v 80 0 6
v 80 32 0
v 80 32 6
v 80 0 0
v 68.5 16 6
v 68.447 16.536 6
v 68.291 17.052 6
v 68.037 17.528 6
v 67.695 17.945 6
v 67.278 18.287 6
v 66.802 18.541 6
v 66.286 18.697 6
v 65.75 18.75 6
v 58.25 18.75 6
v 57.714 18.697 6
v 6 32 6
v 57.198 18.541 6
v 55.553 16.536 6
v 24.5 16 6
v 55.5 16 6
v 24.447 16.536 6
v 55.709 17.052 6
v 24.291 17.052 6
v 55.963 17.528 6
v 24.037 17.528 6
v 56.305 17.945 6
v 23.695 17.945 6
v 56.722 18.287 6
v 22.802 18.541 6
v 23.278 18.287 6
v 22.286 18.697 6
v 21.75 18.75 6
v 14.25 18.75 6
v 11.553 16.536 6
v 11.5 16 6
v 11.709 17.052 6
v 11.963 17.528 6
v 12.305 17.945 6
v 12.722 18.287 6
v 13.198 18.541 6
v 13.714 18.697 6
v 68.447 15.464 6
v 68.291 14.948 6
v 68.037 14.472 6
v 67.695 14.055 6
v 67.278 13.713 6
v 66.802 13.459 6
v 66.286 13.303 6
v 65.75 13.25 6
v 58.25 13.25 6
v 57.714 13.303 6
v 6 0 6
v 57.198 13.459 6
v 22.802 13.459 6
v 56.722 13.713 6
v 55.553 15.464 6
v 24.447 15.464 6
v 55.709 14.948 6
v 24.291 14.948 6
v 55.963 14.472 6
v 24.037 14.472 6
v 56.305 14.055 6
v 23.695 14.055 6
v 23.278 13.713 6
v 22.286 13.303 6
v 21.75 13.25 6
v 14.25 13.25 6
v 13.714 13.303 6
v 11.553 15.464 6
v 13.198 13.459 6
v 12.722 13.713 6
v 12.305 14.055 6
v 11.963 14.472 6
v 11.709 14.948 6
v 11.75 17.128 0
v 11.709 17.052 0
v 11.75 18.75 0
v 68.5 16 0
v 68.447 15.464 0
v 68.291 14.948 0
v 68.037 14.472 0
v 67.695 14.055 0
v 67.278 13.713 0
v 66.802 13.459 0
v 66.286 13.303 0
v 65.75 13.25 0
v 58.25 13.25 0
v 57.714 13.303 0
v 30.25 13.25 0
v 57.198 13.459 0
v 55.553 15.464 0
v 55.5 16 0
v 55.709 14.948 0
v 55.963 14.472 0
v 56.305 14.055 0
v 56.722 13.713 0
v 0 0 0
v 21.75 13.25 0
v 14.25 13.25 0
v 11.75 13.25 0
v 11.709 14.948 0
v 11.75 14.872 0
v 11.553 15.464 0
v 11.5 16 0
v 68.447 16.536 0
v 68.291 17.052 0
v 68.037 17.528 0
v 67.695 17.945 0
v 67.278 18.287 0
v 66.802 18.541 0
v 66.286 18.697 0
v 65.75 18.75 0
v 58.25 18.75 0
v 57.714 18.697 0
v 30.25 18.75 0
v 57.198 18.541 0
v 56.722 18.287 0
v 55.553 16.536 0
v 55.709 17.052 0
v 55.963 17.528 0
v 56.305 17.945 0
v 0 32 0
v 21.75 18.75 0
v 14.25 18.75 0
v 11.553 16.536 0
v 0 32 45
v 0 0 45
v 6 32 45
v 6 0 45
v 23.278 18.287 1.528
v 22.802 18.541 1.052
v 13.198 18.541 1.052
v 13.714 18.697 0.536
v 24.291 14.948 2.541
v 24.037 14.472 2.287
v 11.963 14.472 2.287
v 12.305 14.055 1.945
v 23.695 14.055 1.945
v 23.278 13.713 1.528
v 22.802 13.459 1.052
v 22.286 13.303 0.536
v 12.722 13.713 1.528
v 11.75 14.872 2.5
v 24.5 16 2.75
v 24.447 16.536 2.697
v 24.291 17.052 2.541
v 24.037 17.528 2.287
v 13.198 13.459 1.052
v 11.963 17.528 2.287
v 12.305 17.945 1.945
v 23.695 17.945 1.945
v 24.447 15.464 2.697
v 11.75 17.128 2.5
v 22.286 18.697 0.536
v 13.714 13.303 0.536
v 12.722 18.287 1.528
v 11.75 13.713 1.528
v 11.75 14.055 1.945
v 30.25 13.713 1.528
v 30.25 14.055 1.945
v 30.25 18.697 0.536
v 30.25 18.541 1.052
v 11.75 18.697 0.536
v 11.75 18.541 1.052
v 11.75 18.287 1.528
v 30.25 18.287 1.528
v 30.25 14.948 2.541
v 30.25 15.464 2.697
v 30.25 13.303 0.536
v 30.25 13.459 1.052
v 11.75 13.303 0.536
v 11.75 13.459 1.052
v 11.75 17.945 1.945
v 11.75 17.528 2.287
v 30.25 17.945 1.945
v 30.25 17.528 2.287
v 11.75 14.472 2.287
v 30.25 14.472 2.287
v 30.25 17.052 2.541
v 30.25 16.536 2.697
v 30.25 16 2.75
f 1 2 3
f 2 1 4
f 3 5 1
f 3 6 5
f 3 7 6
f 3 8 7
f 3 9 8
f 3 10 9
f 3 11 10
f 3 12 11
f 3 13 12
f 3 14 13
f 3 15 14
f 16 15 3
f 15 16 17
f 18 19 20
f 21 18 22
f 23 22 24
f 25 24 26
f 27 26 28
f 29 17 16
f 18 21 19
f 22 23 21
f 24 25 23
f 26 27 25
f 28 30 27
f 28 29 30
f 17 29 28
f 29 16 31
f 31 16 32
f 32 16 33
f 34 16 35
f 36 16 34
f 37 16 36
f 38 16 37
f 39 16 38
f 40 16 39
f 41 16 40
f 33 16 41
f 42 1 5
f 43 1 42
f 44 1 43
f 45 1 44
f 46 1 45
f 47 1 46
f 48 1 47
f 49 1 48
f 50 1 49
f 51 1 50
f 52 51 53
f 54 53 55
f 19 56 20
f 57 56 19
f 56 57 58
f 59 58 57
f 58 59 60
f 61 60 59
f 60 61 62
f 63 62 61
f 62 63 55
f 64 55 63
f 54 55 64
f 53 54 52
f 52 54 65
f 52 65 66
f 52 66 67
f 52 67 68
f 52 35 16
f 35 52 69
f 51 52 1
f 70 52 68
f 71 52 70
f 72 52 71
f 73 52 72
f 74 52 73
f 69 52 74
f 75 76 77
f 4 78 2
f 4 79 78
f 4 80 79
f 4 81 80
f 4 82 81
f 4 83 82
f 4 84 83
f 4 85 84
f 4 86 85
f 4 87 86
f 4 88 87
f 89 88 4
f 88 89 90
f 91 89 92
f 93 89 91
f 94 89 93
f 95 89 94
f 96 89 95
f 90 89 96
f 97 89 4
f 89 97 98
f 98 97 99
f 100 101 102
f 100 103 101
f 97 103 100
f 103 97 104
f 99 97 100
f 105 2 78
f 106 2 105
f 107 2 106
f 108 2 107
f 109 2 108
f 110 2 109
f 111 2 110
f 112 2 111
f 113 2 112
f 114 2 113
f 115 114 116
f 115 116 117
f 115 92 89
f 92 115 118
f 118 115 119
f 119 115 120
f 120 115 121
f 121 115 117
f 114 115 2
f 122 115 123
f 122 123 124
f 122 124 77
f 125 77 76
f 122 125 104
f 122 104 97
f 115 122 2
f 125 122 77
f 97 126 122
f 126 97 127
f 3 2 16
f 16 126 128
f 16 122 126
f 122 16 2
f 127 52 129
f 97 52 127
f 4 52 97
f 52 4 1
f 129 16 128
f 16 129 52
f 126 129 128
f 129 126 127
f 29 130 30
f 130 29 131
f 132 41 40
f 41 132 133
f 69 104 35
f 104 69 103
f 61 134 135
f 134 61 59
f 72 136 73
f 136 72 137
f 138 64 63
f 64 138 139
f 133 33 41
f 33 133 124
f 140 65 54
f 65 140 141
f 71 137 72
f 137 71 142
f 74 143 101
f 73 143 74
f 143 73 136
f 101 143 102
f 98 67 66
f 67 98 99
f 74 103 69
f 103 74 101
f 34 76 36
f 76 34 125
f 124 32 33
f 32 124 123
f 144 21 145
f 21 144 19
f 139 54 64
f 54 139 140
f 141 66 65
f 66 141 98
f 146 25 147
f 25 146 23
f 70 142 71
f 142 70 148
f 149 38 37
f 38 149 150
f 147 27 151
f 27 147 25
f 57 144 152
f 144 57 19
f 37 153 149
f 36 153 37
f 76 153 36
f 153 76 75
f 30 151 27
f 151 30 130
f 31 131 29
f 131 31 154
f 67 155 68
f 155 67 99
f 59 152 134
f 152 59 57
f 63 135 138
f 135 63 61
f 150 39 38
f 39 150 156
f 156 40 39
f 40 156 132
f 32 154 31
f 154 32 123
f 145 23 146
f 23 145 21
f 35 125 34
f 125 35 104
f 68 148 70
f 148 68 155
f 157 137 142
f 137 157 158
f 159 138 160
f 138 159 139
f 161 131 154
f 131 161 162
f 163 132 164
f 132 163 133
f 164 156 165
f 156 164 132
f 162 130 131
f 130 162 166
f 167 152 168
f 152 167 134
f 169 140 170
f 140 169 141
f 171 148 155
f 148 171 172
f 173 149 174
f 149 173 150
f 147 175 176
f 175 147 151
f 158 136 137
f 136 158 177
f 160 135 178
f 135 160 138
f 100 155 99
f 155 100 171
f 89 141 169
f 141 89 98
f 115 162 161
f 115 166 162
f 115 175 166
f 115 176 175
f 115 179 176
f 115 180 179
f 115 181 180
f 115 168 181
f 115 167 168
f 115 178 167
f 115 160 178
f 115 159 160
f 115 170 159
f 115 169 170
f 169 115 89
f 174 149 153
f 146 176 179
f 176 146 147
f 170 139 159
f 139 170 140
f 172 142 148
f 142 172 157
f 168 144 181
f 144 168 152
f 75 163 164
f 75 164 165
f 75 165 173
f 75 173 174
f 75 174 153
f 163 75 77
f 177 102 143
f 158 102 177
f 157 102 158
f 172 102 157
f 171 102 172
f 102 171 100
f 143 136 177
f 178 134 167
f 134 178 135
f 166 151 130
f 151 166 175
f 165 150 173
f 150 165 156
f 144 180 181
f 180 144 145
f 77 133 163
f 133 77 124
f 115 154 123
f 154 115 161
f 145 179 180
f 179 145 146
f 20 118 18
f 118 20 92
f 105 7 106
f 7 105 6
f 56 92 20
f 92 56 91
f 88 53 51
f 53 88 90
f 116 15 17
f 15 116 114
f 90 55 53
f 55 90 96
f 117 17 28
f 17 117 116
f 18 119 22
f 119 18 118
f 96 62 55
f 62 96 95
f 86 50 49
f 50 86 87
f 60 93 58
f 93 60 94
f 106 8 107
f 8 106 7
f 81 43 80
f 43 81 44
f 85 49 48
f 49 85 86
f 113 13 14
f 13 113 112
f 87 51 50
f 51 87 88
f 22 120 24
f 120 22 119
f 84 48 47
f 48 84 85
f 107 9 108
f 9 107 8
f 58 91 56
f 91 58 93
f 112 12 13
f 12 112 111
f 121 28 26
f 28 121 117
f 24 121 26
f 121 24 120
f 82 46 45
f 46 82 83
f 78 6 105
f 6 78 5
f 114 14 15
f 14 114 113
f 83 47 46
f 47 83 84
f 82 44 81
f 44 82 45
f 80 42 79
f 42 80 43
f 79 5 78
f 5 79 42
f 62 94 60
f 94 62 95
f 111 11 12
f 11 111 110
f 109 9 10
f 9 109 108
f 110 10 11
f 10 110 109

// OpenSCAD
$fn = 32;

// ----------------------------------------------------------------------
// L-bracket: 80 x 32 x 45 mm
// ----------------------------------------------------------------------

// --- parameters (mm) ---
arm_x = 80;               // horizontal leg, X
arm_z = 45;               // vertical leg, Z
width = 32;               // bracket depth, Y
wall = 6;                 // plate thickness
hole_d = 9;               // clearance for M8
slot_w = 5.5;             // euro screw slot width
slot_l = 13;              // euro screw slot length

module hole_z(px, py) {
  translate([px, py, -2.5]) cylinder(h = wall + 5, d = hole_d);
}
module hole_x(pz, py) {
  translate([-2.5, py, pz]) rotate([0, 90, 0]) cylinder(h = wall + 5, d = hole_d);
}
module euro_slot_z(px, py) {
  hull() {
    translate([px - (slot_l - slot_w) / 2, py, -2.5]) cylinder(h = wall + 5, d = slot_w);
    translate([px + (slot_l - slot_w) / 2, py, -2.5]) cylinder(h = wall + 5, d = slot_w);
  }
}
module euro_slot_x(pz, py) {
  translate([-2.5, 0, 0]) rotate([0, 90, 0]) hull() {
    translate([0, py, pz - (slot_l - slot_w) / 2]) cylinder(h = wall + 5, d = slot_w);
    translate([0, py, pz + (slot_l - slot_w) / 2]) cylinder(h = wall + 5, d = slot_w);
  }
}

difference() {
  union() {
    /* horizontal leg */
    cube([arm_x, width, wall]);
    /* vertical leg, overlapping the corner block */
    cube([wall, width, arm_z]);
  }
  euro_slot_z(18, 16);
  euro_slot_x(18, 16);
  euro_slot_z(62, 16);
}
